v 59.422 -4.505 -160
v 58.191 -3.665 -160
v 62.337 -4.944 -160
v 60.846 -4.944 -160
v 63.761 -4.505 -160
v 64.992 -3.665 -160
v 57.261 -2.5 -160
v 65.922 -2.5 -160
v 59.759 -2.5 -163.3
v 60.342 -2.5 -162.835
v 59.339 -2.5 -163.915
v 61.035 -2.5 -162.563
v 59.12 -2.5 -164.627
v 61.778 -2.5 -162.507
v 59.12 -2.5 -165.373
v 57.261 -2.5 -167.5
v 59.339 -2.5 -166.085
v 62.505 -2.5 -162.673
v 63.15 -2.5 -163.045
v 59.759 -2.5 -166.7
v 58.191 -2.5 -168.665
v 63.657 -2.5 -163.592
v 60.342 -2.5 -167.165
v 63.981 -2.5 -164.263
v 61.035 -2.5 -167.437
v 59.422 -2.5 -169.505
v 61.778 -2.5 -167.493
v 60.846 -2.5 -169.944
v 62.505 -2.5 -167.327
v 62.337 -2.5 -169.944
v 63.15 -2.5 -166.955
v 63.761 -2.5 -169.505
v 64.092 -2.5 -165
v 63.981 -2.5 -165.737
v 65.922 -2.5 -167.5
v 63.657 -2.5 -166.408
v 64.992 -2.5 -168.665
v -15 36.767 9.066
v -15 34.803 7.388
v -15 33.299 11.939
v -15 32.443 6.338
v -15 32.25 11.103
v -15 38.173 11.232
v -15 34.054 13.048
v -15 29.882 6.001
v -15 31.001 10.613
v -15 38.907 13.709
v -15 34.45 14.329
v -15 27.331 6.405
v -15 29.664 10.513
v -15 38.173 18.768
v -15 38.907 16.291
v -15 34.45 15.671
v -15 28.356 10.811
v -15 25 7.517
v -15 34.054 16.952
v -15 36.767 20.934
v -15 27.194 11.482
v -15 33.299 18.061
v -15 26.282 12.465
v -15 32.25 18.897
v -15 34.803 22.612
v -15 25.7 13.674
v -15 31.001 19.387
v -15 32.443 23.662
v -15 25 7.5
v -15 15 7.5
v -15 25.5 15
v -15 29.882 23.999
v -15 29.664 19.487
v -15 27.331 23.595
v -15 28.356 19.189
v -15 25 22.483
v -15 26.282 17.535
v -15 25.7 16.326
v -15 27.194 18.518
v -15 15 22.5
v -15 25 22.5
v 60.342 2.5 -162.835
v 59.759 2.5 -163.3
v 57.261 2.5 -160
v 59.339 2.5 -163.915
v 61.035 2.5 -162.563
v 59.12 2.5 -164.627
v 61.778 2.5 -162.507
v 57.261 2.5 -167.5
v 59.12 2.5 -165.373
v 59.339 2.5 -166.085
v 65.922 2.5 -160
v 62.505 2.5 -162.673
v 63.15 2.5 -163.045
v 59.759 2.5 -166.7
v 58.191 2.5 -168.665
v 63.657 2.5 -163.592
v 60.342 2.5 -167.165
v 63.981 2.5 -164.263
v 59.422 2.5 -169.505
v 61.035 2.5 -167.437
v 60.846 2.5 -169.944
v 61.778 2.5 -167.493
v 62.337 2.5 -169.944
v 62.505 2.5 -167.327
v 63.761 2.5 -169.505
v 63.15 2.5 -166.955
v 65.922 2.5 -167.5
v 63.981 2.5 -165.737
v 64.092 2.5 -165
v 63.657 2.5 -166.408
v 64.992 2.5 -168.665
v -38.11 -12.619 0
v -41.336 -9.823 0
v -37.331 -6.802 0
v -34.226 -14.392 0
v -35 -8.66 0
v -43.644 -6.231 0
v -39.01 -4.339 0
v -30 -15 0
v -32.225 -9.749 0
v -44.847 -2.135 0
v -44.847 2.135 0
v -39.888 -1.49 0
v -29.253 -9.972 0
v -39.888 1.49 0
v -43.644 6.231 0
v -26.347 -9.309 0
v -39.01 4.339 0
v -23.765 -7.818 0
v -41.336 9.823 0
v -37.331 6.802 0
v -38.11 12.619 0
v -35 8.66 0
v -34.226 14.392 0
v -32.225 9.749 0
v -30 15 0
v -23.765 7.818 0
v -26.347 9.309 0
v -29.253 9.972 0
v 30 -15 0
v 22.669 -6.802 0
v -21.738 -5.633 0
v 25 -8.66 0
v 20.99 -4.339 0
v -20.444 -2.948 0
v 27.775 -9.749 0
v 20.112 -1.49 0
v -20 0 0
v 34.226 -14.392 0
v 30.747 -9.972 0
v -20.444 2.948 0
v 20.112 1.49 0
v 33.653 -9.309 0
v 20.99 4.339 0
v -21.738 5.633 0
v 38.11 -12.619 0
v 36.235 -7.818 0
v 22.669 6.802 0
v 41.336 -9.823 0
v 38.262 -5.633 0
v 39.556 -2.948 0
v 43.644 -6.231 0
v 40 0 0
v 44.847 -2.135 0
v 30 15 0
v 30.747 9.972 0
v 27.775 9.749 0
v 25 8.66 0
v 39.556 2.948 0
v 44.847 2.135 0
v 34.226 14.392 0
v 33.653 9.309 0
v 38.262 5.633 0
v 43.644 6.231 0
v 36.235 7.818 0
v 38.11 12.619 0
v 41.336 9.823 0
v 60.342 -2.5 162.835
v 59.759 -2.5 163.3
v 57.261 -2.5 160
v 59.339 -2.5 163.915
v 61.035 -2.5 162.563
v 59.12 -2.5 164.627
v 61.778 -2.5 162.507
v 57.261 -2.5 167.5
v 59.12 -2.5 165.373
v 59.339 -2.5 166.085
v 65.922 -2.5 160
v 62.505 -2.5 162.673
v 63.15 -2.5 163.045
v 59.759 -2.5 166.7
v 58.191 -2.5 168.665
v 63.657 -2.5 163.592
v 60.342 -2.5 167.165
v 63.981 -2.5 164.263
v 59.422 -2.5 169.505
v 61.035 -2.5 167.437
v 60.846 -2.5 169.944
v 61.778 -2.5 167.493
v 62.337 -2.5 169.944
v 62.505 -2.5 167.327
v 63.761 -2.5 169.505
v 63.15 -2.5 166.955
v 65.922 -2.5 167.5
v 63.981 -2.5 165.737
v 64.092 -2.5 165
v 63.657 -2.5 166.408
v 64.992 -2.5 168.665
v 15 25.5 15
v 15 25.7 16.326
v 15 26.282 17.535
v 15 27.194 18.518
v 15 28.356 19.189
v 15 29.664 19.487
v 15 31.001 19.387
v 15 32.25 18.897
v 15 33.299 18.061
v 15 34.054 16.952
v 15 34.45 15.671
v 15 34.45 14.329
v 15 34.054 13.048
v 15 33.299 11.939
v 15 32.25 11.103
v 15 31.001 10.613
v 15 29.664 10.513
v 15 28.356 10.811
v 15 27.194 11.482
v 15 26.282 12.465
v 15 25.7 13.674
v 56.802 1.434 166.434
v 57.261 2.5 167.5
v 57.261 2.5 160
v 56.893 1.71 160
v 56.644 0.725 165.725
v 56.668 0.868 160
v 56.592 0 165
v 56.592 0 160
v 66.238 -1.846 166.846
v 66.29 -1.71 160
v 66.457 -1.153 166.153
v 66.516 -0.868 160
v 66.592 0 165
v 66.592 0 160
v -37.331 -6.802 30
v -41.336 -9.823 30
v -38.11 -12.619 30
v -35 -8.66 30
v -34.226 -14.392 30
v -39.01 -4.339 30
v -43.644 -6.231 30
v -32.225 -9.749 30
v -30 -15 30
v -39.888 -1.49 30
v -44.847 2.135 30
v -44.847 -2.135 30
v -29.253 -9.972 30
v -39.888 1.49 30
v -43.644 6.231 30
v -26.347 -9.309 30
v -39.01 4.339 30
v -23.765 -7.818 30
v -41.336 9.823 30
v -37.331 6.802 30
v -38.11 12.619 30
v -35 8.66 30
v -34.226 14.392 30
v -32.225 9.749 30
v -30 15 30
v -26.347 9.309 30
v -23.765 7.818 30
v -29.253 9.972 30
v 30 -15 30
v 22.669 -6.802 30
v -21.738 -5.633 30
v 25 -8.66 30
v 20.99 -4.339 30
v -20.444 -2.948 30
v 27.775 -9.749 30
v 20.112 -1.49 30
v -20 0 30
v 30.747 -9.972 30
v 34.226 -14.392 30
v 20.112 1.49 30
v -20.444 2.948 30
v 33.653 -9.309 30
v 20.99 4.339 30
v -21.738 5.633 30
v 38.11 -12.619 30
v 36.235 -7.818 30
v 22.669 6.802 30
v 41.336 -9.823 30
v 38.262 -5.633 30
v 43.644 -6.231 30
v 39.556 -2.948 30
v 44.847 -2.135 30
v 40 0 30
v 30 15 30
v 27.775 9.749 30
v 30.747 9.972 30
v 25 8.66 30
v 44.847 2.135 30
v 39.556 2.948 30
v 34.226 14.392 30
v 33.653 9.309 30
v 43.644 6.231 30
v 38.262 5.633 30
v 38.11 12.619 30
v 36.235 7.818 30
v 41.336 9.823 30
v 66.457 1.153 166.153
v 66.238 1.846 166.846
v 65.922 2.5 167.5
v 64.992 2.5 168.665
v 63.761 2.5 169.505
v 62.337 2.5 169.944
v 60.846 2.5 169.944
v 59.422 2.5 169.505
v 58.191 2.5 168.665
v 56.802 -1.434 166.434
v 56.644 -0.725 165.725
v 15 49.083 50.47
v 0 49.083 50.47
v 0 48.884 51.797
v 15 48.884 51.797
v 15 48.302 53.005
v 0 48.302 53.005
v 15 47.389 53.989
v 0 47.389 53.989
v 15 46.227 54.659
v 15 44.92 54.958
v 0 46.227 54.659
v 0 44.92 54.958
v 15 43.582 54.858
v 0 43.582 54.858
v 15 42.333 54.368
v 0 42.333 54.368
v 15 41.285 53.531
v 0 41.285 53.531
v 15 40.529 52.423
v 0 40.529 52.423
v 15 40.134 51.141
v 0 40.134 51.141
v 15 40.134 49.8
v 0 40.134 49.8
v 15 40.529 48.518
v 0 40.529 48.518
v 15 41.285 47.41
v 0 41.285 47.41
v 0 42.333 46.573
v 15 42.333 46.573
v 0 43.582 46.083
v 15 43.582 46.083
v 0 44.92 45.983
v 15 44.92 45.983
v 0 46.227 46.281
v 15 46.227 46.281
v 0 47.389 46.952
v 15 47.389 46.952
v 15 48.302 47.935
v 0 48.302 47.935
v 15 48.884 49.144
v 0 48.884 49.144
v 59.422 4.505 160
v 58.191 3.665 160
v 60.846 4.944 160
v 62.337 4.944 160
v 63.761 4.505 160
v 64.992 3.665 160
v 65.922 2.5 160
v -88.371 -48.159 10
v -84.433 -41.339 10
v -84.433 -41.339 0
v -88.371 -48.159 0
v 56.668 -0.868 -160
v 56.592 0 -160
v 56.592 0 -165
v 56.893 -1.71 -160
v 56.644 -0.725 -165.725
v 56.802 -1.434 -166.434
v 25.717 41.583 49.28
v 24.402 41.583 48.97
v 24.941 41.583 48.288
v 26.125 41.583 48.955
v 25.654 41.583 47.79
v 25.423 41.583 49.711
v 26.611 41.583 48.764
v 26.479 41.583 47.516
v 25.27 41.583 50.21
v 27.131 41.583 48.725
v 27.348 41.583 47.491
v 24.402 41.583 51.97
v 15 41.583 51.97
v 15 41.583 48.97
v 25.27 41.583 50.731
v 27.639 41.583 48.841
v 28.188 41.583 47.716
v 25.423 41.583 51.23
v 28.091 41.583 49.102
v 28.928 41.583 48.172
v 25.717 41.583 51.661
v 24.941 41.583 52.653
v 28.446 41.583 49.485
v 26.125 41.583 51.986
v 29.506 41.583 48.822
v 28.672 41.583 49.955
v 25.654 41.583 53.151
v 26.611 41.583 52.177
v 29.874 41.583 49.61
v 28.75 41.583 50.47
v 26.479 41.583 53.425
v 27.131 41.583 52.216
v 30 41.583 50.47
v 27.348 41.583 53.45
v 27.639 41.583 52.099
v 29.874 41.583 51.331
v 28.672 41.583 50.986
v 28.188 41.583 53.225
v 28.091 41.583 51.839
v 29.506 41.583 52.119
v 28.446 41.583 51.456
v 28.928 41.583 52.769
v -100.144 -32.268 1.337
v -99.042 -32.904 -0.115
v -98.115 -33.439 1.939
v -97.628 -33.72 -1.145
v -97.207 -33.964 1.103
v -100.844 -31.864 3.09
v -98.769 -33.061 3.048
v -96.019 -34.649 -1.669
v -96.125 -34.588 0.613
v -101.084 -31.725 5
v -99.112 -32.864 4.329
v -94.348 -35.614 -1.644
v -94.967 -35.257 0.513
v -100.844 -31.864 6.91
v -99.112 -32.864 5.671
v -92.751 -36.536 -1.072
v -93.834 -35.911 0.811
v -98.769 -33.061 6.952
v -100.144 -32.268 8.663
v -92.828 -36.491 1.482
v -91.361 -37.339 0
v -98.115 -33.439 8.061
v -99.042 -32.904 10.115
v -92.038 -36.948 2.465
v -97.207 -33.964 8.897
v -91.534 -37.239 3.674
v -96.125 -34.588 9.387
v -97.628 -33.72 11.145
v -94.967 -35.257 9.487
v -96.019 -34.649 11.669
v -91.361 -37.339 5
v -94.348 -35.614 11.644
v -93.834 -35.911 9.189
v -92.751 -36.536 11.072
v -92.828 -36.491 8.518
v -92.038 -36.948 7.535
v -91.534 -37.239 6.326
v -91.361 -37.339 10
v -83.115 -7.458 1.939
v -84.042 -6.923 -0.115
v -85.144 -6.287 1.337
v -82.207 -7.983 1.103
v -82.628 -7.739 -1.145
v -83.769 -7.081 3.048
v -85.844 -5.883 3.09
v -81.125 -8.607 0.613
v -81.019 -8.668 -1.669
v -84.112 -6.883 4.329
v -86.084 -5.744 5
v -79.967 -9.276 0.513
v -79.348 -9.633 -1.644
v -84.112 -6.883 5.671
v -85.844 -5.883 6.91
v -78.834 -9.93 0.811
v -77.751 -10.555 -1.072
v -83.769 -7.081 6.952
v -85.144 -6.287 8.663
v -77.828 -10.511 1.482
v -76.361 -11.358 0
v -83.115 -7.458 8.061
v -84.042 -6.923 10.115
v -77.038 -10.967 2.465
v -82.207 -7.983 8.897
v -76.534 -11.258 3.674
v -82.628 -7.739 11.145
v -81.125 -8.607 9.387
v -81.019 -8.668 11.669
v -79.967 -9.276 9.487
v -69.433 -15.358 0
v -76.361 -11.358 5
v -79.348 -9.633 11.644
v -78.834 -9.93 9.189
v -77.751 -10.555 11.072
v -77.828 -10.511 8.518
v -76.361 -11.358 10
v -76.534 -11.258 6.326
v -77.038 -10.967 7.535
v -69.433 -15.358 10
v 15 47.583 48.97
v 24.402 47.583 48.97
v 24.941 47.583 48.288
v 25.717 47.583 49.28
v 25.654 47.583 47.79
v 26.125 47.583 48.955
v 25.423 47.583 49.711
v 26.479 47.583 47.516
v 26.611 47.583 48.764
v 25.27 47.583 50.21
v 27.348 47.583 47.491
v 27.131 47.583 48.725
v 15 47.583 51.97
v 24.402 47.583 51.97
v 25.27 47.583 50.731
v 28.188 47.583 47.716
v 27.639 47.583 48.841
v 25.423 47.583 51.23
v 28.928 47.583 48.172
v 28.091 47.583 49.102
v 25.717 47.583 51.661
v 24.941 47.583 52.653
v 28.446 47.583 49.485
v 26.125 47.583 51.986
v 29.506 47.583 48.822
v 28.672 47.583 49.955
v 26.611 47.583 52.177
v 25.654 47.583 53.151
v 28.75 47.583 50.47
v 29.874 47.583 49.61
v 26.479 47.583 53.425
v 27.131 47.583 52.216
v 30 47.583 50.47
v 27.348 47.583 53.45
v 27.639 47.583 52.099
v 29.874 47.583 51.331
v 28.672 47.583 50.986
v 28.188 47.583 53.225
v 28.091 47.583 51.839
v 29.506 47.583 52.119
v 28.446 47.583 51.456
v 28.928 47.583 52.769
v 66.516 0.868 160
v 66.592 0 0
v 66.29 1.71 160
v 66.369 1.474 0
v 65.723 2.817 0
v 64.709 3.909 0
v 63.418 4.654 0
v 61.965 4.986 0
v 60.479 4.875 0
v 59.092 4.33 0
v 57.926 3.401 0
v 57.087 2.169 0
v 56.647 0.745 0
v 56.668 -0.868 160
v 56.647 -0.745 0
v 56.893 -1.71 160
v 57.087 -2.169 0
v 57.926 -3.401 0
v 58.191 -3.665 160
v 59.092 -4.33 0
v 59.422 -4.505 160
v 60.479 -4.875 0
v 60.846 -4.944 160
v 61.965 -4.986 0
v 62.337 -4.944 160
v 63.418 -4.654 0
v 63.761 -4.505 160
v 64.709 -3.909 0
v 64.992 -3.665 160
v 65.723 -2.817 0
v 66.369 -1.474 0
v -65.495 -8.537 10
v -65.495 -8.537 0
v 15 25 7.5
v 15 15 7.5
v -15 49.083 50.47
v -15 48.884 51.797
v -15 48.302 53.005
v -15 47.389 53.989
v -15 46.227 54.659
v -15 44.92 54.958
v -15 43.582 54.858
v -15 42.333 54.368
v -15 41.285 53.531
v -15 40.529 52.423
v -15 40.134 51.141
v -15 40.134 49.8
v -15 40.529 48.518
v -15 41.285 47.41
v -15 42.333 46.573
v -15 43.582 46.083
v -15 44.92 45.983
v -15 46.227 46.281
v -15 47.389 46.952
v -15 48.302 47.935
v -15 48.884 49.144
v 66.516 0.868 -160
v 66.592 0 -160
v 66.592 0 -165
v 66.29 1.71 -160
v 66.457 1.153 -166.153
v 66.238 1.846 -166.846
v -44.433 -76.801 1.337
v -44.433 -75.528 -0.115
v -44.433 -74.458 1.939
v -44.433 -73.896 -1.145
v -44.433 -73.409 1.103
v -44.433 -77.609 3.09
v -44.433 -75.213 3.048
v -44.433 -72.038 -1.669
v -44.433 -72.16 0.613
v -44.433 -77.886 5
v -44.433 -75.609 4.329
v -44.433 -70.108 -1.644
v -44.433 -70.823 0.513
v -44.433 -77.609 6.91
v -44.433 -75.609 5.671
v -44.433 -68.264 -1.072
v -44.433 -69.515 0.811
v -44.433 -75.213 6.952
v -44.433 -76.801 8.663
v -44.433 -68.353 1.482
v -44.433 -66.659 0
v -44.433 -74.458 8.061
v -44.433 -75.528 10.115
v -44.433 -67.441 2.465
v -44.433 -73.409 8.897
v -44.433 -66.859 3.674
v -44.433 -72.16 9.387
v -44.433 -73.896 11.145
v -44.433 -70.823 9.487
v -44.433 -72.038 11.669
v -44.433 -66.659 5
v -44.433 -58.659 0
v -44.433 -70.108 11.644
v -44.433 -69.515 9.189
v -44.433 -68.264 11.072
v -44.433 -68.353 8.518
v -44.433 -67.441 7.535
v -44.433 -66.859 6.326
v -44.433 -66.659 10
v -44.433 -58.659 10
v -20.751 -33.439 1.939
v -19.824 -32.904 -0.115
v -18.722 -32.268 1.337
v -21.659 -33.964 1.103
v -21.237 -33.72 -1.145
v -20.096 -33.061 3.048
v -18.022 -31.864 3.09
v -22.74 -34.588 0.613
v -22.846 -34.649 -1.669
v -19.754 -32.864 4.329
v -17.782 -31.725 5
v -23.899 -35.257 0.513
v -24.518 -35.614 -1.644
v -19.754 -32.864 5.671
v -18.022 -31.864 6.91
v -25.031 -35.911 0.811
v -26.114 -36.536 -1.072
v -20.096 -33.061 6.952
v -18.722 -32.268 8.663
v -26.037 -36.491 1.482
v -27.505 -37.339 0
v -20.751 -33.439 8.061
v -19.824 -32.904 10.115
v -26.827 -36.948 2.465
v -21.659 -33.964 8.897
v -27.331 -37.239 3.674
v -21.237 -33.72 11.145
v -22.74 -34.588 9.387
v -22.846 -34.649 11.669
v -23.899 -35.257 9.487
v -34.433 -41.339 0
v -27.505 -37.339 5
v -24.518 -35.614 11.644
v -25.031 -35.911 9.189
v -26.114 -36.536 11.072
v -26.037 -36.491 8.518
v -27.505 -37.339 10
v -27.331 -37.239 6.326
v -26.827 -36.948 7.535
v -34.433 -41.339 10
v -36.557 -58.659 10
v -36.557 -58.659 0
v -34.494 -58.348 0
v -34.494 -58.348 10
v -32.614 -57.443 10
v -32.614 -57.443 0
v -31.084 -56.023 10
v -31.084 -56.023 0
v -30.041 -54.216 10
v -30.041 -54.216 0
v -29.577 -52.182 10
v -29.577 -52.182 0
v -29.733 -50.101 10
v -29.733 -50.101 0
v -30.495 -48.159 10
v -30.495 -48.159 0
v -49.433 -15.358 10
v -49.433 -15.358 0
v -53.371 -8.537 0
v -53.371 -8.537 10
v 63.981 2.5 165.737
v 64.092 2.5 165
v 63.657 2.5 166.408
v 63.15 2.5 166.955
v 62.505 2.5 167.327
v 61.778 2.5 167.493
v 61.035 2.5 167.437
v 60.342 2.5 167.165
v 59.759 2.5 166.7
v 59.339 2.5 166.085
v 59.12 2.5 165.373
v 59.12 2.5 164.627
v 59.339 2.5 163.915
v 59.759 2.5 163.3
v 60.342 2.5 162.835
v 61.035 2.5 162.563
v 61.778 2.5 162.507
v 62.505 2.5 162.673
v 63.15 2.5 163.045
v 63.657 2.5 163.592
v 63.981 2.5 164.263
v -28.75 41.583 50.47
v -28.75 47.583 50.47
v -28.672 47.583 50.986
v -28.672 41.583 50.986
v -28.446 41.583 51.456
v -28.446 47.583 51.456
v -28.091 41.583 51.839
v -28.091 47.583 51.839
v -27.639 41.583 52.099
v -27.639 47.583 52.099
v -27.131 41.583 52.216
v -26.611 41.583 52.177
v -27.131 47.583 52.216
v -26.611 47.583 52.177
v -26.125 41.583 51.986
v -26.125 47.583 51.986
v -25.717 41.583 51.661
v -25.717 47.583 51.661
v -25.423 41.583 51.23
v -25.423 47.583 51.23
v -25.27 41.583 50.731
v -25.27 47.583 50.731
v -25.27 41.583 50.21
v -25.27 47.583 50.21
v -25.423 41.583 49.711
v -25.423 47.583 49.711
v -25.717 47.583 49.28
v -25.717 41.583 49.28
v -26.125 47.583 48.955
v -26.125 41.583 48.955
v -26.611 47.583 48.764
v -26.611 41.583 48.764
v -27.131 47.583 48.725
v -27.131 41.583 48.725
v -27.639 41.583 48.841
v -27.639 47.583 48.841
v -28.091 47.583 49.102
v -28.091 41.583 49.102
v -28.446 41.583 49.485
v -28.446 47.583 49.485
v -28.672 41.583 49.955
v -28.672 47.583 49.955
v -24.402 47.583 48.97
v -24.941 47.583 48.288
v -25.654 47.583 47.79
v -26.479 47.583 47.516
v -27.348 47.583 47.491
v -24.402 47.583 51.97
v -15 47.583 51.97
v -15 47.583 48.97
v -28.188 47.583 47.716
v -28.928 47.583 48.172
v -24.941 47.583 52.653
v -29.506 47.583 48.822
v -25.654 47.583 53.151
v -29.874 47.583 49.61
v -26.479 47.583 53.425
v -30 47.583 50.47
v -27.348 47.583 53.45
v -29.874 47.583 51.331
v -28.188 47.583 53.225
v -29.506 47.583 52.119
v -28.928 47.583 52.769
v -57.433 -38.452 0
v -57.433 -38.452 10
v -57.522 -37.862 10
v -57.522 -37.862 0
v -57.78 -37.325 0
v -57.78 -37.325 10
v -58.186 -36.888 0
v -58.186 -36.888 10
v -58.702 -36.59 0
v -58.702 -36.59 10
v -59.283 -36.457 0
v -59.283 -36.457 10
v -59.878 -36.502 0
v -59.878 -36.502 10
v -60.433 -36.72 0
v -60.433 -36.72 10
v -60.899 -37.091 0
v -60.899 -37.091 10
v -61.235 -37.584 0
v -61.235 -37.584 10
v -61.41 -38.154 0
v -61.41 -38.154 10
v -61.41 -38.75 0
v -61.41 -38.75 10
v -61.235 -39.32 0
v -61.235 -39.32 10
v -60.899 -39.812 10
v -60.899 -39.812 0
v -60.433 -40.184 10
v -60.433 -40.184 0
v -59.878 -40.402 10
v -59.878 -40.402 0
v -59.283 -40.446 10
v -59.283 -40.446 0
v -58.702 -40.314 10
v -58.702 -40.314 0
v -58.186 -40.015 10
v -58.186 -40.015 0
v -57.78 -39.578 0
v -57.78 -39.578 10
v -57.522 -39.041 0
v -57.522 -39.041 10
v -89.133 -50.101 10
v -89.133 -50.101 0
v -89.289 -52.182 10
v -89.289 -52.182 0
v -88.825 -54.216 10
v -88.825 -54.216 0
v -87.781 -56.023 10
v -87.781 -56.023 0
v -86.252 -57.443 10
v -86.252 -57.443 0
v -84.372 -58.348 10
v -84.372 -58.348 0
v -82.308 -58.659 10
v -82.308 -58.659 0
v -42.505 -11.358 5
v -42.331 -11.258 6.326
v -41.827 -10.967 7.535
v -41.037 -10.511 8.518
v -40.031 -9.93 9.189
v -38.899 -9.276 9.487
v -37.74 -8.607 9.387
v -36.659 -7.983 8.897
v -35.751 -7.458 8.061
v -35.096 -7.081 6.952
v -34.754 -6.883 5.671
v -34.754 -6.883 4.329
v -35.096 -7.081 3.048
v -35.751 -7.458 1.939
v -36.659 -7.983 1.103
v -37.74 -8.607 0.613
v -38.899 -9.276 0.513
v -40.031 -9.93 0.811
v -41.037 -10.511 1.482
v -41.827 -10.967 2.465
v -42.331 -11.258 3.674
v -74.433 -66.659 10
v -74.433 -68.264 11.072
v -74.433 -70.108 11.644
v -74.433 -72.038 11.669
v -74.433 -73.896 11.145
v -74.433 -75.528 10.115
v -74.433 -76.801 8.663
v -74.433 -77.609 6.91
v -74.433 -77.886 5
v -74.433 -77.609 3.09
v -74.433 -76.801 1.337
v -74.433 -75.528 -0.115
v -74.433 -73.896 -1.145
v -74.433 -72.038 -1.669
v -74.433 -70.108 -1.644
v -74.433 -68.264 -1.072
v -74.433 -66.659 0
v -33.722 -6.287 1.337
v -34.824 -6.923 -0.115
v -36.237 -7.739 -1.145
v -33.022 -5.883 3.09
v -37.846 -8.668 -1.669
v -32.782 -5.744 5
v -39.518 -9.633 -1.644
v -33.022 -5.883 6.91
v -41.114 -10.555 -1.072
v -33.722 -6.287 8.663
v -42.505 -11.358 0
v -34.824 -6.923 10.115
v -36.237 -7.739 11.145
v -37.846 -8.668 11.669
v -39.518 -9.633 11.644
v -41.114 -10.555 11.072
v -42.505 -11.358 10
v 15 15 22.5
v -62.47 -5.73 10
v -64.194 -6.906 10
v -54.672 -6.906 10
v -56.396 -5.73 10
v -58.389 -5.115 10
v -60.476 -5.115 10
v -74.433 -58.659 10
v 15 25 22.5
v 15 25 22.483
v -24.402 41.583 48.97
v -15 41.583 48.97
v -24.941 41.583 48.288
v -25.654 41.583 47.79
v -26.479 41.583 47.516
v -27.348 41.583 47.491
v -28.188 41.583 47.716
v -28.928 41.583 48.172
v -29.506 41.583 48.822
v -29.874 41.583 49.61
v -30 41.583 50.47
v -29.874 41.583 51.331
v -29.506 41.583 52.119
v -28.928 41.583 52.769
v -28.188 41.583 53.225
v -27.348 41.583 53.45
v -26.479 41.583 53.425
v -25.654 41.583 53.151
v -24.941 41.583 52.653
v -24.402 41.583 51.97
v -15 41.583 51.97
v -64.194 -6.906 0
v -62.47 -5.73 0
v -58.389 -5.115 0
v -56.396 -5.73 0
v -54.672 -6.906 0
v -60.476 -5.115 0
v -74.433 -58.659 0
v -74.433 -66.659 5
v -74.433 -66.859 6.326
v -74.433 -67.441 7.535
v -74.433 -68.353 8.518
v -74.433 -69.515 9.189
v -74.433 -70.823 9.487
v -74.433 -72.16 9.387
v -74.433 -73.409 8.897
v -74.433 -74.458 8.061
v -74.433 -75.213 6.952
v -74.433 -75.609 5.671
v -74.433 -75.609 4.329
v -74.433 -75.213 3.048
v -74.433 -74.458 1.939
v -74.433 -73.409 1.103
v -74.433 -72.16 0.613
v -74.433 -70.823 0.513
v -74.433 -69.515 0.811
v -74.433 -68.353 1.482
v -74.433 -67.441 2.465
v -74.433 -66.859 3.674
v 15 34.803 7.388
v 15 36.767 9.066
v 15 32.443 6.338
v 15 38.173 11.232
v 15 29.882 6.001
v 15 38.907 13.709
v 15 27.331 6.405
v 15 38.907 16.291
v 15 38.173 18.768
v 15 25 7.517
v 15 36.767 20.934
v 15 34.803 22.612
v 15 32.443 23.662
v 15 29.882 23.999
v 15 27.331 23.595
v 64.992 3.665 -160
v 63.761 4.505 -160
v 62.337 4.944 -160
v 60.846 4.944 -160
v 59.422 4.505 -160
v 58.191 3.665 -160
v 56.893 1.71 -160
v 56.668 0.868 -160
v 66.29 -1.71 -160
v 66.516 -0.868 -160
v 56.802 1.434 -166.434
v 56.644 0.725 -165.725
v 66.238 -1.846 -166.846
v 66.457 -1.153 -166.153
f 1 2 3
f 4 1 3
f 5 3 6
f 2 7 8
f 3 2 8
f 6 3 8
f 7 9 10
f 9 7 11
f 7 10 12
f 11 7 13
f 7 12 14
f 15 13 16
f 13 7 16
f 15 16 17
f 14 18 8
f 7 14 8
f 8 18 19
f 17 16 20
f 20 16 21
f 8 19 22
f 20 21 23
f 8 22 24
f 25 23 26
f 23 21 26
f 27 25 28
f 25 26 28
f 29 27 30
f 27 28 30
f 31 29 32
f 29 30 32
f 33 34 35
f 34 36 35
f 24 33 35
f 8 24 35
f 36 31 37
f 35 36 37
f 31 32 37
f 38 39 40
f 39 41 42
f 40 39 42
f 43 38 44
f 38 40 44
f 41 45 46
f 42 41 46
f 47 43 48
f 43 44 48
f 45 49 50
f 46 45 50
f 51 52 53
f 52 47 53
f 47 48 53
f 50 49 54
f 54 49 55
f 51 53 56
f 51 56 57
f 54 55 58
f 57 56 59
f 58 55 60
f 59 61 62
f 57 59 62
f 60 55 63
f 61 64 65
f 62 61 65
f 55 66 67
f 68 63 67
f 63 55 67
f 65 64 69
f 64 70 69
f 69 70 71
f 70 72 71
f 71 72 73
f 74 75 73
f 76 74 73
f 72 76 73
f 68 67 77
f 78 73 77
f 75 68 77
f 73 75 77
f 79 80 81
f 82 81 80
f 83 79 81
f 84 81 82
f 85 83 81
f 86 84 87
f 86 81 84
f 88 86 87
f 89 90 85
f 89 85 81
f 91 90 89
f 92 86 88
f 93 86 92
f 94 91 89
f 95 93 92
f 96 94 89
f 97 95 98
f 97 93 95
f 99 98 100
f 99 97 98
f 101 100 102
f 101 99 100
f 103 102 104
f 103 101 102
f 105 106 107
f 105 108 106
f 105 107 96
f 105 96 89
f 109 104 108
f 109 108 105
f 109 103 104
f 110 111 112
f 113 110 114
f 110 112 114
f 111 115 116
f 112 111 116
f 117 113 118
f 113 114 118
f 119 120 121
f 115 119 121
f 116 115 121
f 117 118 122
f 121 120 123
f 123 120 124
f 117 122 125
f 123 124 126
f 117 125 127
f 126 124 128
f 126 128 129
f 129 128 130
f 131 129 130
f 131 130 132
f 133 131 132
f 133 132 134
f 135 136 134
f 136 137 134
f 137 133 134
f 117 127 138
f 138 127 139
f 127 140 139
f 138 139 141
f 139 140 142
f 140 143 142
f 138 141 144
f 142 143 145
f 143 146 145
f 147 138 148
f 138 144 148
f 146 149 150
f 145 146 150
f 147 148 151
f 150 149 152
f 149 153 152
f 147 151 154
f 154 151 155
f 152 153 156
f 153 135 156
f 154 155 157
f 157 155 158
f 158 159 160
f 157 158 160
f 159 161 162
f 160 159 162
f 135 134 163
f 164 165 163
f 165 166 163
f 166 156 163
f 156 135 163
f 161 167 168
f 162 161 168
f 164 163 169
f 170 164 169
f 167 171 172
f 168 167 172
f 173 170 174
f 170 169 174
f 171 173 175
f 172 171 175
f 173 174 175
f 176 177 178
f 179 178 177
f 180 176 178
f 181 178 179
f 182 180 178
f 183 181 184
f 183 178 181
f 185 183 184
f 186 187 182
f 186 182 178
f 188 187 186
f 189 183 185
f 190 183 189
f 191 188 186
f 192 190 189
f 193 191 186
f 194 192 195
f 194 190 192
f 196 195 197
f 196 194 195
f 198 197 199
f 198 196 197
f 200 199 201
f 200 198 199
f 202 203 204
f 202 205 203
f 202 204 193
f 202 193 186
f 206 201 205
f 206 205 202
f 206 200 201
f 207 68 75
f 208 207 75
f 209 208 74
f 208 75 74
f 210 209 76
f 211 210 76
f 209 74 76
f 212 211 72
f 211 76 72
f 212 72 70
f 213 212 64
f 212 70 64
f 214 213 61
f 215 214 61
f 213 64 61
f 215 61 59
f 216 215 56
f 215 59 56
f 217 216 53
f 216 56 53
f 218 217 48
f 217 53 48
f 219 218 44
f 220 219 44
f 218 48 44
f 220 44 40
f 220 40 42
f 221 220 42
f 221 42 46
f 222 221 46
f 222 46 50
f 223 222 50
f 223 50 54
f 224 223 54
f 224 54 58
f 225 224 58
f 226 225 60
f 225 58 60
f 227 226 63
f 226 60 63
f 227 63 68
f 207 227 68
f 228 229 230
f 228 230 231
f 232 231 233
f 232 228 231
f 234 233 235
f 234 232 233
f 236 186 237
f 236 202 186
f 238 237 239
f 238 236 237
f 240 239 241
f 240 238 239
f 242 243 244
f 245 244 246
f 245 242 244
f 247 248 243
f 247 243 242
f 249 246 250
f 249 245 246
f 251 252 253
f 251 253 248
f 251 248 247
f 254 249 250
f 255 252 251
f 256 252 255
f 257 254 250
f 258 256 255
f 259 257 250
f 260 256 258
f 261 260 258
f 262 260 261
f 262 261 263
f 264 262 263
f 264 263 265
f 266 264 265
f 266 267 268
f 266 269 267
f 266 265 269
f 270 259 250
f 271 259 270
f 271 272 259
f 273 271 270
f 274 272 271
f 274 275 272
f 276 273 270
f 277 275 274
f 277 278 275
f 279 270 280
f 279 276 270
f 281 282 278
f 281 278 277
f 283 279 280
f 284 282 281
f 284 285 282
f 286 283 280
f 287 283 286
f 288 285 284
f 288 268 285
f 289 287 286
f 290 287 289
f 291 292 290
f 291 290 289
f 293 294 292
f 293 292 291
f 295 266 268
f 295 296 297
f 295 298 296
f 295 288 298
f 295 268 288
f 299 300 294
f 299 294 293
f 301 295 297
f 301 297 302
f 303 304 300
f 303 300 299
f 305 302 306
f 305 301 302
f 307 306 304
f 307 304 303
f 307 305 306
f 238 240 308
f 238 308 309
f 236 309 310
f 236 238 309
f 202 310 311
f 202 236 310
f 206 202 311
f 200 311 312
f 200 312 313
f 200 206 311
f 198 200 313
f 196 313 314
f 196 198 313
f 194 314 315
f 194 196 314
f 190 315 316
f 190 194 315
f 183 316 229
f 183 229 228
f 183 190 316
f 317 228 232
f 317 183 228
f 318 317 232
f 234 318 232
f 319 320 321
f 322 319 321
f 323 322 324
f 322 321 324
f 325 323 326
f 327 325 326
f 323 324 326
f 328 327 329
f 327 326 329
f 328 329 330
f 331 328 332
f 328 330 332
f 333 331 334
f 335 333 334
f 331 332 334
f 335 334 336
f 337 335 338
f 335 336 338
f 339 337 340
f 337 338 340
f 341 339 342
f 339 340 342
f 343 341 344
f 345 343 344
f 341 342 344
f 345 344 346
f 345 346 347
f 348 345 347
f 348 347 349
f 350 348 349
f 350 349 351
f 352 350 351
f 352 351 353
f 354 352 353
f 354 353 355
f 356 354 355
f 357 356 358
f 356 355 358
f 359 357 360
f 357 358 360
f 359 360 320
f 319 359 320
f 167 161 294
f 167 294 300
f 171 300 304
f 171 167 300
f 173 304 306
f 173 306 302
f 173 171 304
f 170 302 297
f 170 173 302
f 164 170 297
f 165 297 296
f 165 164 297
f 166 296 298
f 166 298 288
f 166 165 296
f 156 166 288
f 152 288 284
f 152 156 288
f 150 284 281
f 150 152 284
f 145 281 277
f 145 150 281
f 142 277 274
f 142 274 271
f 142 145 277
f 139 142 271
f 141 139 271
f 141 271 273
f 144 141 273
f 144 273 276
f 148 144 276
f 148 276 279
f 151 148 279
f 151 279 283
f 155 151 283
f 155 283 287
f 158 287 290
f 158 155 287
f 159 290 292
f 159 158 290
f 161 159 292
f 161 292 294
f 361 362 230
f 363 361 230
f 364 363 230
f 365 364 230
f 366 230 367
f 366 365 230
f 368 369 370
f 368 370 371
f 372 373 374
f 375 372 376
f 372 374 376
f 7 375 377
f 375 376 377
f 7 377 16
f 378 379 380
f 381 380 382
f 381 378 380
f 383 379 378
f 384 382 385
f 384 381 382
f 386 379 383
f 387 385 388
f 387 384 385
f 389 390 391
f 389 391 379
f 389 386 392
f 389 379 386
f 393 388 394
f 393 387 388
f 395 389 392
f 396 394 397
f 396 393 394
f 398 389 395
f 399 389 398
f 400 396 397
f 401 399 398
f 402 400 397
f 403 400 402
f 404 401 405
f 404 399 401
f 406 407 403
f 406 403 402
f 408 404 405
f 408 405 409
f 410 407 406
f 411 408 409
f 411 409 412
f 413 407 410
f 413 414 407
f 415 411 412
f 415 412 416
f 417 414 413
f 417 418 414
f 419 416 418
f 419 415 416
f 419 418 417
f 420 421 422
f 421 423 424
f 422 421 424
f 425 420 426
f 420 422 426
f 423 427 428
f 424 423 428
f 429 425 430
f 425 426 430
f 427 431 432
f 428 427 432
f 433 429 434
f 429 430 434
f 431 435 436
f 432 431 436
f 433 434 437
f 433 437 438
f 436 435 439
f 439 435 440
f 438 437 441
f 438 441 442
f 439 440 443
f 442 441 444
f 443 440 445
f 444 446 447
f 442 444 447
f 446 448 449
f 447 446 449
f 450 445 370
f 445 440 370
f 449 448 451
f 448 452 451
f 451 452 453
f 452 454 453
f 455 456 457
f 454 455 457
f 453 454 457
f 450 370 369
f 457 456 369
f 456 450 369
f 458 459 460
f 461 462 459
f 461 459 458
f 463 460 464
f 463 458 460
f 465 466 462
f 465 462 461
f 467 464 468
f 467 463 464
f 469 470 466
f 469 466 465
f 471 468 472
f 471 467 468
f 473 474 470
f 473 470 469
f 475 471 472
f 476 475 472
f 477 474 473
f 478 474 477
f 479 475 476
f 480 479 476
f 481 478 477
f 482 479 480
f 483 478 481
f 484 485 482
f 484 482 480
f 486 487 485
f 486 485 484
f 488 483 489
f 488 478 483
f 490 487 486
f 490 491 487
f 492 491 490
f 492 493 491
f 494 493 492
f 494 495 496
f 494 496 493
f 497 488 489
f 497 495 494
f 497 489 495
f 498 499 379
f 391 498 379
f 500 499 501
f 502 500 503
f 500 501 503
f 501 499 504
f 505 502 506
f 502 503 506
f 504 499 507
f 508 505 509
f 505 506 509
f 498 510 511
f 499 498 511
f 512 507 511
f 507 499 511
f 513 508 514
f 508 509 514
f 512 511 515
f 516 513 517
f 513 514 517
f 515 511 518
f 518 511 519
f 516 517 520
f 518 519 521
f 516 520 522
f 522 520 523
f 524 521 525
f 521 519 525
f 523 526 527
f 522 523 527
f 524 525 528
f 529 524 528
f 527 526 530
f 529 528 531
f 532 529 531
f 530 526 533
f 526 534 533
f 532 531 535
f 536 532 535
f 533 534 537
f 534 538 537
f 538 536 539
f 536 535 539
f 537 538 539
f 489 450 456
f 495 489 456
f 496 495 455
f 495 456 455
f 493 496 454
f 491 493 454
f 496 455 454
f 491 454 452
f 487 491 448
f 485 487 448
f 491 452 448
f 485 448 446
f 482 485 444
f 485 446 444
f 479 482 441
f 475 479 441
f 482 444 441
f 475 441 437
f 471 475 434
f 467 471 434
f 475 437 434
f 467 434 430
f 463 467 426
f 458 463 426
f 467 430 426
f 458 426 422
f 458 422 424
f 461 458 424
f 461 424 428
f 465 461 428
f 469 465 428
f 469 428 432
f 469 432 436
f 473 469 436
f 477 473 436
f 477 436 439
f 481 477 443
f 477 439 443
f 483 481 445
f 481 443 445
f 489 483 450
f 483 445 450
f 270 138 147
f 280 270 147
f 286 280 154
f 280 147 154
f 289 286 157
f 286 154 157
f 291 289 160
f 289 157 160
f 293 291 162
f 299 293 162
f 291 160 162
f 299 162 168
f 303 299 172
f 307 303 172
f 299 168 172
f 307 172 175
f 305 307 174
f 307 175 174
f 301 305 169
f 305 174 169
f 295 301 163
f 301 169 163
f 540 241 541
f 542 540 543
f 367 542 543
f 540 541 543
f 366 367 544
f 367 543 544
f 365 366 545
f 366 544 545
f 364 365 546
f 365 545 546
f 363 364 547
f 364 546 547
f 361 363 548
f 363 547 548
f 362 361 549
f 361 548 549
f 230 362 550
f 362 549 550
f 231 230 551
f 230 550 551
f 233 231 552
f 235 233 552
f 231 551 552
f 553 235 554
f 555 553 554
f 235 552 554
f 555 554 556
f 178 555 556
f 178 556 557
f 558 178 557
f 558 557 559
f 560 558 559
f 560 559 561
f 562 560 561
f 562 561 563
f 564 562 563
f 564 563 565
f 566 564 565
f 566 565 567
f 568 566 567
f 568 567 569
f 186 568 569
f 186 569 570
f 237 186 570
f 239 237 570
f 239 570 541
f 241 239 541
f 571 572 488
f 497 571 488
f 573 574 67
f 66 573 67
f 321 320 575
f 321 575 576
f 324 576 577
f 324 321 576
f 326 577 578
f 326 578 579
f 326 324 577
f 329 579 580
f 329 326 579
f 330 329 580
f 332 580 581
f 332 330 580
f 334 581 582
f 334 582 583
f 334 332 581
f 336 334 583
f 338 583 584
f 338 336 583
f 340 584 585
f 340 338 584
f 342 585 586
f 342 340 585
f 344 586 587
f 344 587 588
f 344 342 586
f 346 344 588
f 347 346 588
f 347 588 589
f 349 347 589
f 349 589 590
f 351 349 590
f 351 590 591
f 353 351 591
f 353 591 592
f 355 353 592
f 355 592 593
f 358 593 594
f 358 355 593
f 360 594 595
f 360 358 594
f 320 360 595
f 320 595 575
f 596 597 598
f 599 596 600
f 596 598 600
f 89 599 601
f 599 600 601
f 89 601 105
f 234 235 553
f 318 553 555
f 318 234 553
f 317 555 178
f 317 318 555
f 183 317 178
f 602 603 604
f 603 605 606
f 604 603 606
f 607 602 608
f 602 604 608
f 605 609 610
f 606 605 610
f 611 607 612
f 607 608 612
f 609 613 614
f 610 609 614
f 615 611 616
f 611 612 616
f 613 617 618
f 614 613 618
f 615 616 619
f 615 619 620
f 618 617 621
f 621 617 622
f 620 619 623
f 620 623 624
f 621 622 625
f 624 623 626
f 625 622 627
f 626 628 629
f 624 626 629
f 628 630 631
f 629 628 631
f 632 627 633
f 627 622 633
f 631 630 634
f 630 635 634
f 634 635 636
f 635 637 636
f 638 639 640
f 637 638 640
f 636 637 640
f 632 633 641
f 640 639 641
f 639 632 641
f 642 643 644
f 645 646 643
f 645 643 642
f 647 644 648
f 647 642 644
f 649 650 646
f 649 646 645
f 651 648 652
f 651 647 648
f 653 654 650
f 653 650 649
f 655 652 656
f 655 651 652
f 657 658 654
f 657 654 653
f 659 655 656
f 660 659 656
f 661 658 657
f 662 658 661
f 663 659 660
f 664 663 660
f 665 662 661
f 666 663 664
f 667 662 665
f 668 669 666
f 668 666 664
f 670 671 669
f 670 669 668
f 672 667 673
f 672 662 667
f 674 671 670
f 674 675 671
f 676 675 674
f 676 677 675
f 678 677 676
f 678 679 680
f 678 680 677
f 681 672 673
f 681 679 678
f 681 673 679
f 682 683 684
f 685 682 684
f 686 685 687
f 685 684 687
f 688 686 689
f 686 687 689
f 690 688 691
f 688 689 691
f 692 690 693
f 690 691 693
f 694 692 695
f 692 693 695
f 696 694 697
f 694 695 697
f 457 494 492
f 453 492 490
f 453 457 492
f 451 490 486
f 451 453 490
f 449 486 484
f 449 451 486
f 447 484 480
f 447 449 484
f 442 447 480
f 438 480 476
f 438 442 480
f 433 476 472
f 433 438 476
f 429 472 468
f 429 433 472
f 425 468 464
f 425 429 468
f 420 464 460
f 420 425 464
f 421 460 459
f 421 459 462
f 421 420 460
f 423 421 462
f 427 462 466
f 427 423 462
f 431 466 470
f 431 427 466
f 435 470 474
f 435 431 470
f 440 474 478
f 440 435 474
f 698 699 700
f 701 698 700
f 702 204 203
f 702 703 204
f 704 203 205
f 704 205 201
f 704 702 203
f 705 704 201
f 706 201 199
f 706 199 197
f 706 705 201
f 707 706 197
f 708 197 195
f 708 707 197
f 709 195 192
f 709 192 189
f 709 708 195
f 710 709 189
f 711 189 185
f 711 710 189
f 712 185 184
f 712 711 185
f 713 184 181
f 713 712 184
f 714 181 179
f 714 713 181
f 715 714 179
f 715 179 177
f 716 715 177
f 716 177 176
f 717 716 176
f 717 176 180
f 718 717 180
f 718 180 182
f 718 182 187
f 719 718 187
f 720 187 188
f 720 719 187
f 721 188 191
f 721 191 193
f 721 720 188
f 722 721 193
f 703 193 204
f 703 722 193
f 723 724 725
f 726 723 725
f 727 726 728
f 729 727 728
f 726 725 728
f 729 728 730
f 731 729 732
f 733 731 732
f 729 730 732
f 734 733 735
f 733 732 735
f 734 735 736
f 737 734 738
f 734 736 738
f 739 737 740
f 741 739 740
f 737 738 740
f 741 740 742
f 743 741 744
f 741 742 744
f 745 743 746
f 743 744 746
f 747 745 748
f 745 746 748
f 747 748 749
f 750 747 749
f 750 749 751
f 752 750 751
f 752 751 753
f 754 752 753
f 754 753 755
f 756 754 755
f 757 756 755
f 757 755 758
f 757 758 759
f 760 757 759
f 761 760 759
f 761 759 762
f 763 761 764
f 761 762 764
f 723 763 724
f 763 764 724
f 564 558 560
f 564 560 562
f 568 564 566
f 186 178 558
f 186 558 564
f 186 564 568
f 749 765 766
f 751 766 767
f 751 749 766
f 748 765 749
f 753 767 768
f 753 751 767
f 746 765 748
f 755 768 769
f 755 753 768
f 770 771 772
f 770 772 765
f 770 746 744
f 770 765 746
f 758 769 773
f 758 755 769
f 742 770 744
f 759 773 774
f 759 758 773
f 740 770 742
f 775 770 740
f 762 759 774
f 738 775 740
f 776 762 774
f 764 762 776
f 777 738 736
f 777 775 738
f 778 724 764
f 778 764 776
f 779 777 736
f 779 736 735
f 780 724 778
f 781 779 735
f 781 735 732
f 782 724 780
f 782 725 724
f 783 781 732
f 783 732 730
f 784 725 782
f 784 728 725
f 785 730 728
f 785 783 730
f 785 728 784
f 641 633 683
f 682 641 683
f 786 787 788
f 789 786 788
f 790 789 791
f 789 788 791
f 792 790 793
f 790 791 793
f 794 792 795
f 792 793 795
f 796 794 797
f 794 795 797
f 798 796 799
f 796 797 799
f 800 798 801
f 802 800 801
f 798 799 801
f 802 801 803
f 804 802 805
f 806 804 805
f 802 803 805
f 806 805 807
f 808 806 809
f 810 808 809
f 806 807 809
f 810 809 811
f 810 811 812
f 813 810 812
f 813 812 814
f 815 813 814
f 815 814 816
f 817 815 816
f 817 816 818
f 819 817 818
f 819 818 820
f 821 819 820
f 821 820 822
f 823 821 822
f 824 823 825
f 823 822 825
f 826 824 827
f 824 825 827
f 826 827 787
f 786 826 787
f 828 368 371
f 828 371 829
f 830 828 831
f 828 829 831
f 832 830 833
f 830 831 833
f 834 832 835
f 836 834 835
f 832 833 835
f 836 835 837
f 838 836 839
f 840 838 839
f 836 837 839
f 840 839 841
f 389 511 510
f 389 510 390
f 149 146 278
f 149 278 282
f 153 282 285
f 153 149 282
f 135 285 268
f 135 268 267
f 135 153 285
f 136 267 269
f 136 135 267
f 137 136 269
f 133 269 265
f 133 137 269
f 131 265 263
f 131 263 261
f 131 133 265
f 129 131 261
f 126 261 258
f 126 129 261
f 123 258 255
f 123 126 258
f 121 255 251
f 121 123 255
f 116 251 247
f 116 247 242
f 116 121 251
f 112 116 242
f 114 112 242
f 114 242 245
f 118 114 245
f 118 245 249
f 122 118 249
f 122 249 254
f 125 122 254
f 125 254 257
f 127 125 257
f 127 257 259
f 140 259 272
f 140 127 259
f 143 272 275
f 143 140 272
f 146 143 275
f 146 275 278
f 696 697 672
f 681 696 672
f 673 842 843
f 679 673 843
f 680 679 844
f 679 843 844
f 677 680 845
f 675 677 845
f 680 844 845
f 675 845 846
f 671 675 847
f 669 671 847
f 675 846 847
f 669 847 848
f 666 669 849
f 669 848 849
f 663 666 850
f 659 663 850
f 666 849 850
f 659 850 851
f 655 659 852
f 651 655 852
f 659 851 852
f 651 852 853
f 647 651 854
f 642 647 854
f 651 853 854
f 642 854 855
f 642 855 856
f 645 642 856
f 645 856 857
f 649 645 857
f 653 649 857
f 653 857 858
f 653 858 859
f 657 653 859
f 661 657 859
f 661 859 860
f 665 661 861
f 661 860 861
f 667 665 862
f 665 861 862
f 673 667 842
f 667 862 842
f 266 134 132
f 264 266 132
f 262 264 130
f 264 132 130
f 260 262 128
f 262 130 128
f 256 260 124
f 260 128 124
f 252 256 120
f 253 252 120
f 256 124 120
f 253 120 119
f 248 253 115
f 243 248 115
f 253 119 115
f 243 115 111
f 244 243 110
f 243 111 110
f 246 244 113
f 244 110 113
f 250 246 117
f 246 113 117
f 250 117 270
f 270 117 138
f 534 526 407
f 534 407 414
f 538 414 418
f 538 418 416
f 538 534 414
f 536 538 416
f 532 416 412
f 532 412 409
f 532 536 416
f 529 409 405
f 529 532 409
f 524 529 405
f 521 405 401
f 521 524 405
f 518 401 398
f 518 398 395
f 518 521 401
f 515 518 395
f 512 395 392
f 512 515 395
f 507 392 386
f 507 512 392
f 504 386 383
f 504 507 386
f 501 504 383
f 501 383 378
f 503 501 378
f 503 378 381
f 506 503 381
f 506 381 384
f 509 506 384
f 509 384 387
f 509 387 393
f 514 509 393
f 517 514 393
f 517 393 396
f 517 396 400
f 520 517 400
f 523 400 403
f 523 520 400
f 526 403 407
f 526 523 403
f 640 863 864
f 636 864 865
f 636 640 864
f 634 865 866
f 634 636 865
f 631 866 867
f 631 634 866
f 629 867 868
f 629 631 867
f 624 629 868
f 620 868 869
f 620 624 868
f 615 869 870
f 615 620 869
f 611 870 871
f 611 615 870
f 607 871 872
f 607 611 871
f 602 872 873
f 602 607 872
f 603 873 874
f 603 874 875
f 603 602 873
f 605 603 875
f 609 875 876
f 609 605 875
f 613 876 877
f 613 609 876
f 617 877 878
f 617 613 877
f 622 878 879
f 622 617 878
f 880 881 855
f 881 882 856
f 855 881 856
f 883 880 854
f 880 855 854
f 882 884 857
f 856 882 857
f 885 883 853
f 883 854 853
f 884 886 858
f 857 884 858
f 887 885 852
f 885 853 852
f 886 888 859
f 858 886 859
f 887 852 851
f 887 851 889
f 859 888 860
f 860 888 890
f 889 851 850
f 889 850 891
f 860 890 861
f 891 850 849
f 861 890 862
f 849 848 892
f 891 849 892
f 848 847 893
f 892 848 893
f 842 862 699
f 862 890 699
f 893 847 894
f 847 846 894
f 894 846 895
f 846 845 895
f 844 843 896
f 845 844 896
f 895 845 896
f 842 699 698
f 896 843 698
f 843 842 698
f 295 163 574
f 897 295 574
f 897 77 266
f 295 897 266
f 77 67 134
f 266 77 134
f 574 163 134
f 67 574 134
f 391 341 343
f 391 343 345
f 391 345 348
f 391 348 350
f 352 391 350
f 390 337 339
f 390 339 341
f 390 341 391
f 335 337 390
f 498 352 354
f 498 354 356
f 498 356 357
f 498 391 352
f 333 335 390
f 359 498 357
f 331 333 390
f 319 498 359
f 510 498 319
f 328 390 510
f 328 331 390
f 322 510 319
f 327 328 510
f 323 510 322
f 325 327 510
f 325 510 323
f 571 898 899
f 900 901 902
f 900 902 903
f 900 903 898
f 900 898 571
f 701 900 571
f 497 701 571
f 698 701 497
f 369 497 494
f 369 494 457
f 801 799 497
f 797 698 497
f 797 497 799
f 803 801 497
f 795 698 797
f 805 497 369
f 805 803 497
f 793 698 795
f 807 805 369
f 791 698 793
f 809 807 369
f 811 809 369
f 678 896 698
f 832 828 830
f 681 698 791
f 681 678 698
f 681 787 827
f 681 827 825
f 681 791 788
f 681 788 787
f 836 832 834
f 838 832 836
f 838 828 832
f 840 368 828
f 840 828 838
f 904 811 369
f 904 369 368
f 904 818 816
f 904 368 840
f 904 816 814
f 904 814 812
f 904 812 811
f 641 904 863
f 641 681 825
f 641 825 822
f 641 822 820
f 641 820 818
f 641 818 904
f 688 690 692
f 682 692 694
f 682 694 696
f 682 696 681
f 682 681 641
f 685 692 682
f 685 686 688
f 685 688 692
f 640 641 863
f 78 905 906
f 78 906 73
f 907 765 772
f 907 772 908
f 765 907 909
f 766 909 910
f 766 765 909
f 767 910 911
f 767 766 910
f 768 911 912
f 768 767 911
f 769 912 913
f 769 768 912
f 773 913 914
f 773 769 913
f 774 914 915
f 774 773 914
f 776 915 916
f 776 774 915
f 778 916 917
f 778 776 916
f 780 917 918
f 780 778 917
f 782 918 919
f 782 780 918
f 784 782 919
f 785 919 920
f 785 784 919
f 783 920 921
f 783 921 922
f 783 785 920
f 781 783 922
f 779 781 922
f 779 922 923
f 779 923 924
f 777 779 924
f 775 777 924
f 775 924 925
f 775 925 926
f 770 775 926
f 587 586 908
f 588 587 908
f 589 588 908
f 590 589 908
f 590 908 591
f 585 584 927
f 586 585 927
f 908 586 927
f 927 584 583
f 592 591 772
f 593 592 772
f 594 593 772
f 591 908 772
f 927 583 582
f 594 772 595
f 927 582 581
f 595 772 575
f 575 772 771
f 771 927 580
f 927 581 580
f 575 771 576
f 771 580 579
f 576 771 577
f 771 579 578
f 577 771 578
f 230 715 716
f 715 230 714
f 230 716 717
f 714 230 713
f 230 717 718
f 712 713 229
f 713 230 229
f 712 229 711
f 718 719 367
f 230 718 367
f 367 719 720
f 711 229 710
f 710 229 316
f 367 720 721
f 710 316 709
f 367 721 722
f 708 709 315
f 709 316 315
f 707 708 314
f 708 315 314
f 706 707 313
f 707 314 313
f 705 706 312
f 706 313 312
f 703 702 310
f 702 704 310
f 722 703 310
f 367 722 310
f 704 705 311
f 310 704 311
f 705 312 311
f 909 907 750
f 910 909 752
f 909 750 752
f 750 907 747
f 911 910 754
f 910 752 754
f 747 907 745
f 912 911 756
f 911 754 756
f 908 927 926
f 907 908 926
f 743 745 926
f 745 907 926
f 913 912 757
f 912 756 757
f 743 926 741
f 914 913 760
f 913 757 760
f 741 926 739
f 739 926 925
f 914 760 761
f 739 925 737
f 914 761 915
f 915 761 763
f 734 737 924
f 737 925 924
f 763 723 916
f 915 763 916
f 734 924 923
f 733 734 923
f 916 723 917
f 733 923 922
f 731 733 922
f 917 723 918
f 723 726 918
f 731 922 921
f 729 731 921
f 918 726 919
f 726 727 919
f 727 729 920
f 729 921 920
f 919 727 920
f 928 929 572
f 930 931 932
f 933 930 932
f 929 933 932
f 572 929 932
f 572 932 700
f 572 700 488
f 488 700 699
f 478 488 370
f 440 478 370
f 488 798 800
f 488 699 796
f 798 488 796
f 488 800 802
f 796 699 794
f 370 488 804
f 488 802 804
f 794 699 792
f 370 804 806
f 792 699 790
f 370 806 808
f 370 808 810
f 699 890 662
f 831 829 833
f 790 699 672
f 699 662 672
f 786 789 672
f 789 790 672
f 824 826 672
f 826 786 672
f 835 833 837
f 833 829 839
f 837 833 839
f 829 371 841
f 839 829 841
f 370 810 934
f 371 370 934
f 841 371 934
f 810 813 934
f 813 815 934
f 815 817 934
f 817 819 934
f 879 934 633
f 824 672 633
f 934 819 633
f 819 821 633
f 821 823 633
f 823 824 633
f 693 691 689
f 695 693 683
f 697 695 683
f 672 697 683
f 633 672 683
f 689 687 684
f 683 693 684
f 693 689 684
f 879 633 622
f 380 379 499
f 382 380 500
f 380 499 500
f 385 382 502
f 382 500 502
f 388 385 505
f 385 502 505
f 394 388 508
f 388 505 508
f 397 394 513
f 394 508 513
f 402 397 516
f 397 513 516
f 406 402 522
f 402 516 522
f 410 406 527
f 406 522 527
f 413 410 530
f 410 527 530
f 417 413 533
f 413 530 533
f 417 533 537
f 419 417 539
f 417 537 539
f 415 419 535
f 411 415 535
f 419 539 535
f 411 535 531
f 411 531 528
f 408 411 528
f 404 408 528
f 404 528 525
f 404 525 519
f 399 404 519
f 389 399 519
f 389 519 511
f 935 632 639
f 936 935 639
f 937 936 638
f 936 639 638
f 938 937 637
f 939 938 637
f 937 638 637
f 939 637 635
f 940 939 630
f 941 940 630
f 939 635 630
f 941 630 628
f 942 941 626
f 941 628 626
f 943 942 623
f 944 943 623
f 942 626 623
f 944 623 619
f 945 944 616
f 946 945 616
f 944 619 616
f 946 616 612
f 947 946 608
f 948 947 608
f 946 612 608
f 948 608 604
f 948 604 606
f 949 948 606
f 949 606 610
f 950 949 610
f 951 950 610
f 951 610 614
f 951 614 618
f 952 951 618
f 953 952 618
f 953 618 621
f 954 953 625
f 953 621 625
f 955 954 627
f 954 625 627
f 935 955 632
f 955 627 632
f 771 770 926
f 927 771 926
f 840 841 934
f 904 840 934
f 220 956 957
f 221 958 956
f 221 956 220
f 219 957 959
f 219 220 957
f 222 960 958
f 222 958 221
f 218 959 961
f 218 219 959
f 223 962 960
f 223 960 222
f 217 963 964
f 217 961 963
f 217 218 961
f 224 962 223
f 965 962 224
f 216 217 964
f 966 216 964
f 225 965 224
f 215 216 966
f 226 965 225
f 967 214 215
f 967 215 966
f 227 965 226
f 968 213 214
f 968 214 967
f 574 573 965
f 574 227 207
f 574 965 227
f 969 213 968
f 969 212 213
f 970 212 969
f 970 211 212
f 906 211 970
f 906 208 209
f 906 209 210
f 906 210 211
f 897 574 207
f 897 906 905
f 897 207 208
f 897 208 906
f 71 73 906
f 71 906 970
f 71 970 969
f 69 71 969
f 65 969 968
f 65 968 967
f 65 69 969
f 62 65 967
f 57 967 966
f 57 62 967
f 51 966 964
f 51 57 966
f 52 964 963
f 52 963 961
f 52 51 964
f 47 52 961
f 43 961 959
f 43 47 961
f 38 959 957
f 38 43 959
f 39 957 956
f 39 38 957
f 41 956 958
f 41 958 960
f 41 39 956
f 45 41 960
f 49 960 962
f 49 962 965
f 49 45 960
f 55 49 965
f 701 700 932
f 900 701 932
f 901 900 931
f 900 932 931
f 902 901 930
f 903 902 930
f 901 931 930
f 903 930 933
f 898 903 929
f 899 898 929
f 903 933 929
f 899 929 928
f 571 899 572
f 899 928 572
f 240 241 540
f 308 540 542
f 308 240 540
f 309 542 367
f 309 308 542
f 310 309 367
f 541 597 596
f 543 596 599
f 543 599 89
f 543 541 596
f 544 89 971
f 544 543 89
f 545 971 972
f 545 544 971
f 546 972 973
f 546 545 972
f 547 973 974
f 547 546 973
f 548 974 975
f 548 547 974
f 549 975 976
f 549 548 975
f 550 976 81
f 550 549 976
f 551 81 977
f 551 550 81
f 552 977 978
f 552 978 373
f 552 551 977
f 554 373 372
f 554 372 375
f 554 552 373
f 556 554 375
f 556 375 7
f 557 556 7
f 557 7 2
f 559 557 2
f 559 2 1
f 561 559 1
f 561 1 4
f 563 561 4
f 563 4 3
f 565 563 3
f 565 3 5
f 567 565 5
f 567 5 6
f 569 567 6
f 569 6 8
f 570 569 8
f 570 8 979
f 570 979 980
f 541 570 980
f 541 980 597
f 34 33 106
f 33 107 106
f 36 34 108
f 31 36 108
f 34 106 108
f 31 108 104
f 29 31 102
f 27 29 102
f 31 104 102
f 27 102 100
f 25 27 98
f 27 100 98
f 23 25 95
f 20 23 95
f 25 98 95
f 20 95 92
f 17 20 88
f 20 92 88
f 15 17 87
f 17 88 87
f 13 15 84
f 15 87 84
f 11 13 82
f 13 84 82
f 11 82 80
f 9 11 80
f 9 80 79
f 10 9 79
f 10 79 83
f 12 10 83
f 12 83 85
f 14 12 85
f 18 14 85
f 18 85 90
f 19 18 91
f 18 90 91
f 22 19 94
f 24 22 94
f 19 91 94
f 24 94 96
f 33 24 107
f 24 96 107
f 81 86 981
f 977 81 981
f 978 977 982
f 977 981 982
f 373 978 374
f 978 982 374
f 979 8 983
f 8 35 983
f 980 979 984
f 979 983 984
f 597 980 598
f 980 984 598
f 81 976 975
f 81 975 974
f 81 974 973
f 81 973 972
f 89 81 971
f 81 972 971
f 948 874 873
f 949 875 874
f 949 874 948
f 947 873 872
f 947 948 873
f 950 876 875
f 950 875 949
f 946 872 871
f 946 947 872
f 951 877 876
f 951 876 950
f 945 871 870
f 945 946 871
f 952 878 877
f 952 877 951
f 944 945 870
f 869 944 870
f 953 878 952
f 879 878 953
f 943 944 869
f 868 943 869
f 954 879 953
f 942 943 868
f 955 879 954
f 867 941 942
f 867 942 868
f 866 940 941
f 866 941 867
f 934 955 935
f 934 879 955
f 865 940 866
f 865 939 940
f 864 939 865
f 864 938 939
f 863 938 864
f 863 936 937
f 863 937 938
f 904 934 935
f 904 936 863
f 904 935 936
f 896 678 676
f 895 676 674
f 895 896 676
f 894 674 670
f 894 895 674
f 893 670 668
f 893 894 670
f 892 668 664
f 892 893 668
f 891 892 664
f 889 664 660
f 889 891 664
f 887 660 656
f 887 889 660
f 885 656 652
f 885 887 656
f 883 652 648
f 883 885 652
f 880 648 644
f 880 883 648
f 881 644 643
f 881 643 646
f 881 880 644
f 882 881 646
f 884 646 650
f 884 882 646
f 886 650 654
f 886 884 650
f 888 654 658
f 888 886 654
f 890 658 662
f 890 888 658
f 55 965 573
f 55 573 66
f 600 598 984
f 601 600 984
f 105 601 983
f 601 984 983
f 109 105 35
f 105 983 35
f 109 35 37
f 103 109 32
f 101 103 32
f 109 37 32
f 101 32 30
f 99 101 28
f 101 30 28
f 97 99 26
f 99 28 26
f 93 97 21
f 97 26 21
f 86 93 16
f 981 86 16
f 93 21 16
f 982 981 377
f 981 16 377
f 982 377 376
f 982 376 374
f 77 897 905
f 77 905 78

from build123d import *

# Parameters (mm, degrees)
F0_R      = 10
F1_DEPTH  = 30
F2_W      = 30
F2_H      = 15
F3_DEPTH  = 10
F4_R      = 9
F4_R_2    = 4.5
F5_DEPTH  = 30
F6_R      = 4.5
F7_DEPTH  = 15
F8_W      = 6
F8_H      = 3
F9_DEPTH  = 10
F10_R     = 3
F10_R_2   = 1.75
F11_DEPTH = 6
F13_R     = 5
F14_DEPTH = 160
F16_R     = 2.5
F17_DEPTH = 2.5
F15_R     = 5
F18_DEPTH = 200
F21_DEPTH = 10
F22_W     = 30
F22_H     = 10
F23_DEPTH = 8
F24_R     = 6.7268120235
F24_R_2   = 4.5
F25_DEPTH = 30
F26_R     = 2
F27_DEPTH = 10
F28_COUNT = 3


with BuildPart() as f1:
    # F0 (on Top) → F1 (new body)
    with BuildSketch(Plane.XY):
        with BuildLine():
            ThreePointArc((30, -15), (45, 0), (30, 15))
            Line((30, 15), (-30, 15))
            ThreePointArc((-30, 15), (-45, 0), (-30, -15))
            Line((-30, -15), (30, -15))
        make_face()
        with Locations((-30, 0)):
            Circle(F0_R, mode=Mode.SUBTRACT)
        with Locations((30, 0)):
            Circle(F0_R, mode=Mode.SUBTRACT)
    extrude(amount=F1_DEPTH)

    # F2 (on face) → F3 (join)
    with BuildSketch(Plane(origin=(0, 15, 0), x_dir=(-1, 0, 0), z_dir=(0, 1, 0))):
        with Locations((0, 15)):
            Rectangle(F2_W, F2_H)
    extrude(amount=F3_DEPTH)

    # F4 (on face) → F5 (join, through all)
    with BuildSketch(Plane(origin=(-15, 0, 0), x_dir=(0, -1, 0), z_dir=(-1, 0, 0))):
        with Locations((-30, 15)):
            Circle(F4_R)
        with Locations((-30, 15)):
            Circle(F4_R_2, mode=Mode.SUBTRACT)
    extrude(amount=-F5_DEPTH)


with BuildPart() as f7:
    # F6 (on Right) → F7 (new body)
    with BuildSketch(Plane.YZ):
        with Locations((44.5834584534, 50.4704043269)):
            Circle(F6_R)
    extrude(amount=-F7_DEPTH)

    # F8 (on face) → F9 (join)
    with BuildSketch(Plane(origin=(-15, 0, 0), x_dir=(0, -1, 0), z_dir=(-1, 0, 0))):
        with Locations((-44.5834584534, 50.4704043269)):
            Rectangle(F8_W, F8_H)
    extrude(amount=F9_DEPTH)

    # F10 (on face) → F11 (join, through all)
    with BuildSketch(Plane(origin=(0, 47.5834584534, 0), x_dir=(-1, 0, 0), z_dir=(0, 1, 0))):
        with Locations((27, 50.4704043269)):
            Circle(F10_R)
        with Locations((27, 50.4704043269)):
            Circle(F10_R_2, mode=Mode.SUBTRACT)
    extrude(amount=-F11_DEPTH)

    # F12: F7 across plane


with BuildPart() as f7_1:
    add(f7.part)
    add(f7.part.mirror(Plane.YZ))


with BuildPart() as f14:
    # F13 (on Top) → F14 (new body)
    with BuildSketch(Plane.XY):
        with Locations((61.5915991366, 0)):
            Circle(F13_R)
    extrude(amount=F14_DEPTH)

    # F16 (on Front) → F17 (join, symmetric)
    with BuildSketch(Plane.XZ):
        with BuildLine():
            Line((56.5915991366, 160), (66.5915991366, 160))
            Line((66.5915991366, 160), (66.5915991366, 165))
            ThreePointArc((66.5915991366, 165), (61.5915991366, 170), (56.5915991366, 165))
            Line((56.5915991366, 165), (56.5915991366, 160))
        make_face()
        with Locations((61.5915991366, 165)):
            Circle(F16_R, mode=Mode.SUBTRACT)
    extrude(amount=F17_DEPTH, both=True)

    # F15 (on face) → F18 (intersect, symmetric)
    with BuildSketch(Plane.XY.offset(160)):
        with Locations((61.5915991366, 0)):
            Circle(F15_R)
    extrude(amount=F18_DEPTH, both=True, mode=Mode.INTERSECT)

    # F19: F14 across plane


with BuildPart() as f14_1:
    add(f14.part)
    add(f14.part.mirror(Plane.XY))


with BuildPart() as f21:
    # F20 (on Top) → F21 (new body)
    with BuildSketch(Plane.XY):
        with BuildLine():
            ThreePointArc((-53.3706004575, -8.5372778672), (-59.432778284, -5.0372778672), (-65.4949561104, -8.5372778672))
            Line((-65.4949561104, -8.5372778672), (-88.3706004575, -48.1590561321))
            ThreePointArc((-88.3706004575, -48.1590561321), (-88.3706004575, -55.1590561321), (-82.308422631, -58.6590561321))
            Line((-82.308422631, -58.6590561321), (-36.5571339369, -58.6590561321))
            ThreePointArc((-36.5571339369, -58.6590561321), (-30.4949561104, -55.1590561321), (-30.4949561104, -48.1590561321))
            Line((-30.4949561104, -48.1590561321), (-53.3706004575, -8.5372778672))
        make_face()
    extrude(amount=F21_DEPTH)

    # F22 (on face) → F23 (join)
    with BuildSketch(Plane(origin=(-45.4244673267, 26.2258284389, 0), x_dir=(-0.5, -0.8660254038, 0), z_dir=(-0.8660254038, 0.5, 0))):
        with Locations((63.0166219144, 5)):
            Rectangle(F22_W, F22_H)
    extrude(amount=F23_DEPTH)

    # F24 (on face) → F25 (join, through all)
    with BuildSketch(Plane(origin=(-39.0083109572, -67.5643764953, 0), x_dir=(0.8660254038, -0.5, 0), z_dir=(-0.5, -0.8660254038, 0))):
        with Locations((-64.9516568778, 5)):
            Circle(F24_R)
        with Locations((-64.9516568778, 5)):
            Circle(F24_R_2, mode=Mode.SUBTRACT)
    extrude(amount=-F25_DEPTH)

    # F26 (on face) → F27 (cut, through all)
    with BuildSketch(Plane.XY.offset(10)):
        with Locations((-59.432778284, -38.4517967105)):
            Circle(F26_R)
    extrude(amount=-F27_DEPTH, mode=Mode.SUBTRACT)

    # F28: F21 ×3 about axis
    f28_axis = Axis((-59.432778284, -38.4517967105, 10), (0, 0, 1))


with BuildPart() as f21_1:
    add(f21.part)
    for i in range(1, F28_COUNT):
        add(f21.part.rotate(f28_axis, i * 360 / F28_COUNT))


solid = Compound([f1.part, f7_1.part, f14_1.part, f21_1.part])
